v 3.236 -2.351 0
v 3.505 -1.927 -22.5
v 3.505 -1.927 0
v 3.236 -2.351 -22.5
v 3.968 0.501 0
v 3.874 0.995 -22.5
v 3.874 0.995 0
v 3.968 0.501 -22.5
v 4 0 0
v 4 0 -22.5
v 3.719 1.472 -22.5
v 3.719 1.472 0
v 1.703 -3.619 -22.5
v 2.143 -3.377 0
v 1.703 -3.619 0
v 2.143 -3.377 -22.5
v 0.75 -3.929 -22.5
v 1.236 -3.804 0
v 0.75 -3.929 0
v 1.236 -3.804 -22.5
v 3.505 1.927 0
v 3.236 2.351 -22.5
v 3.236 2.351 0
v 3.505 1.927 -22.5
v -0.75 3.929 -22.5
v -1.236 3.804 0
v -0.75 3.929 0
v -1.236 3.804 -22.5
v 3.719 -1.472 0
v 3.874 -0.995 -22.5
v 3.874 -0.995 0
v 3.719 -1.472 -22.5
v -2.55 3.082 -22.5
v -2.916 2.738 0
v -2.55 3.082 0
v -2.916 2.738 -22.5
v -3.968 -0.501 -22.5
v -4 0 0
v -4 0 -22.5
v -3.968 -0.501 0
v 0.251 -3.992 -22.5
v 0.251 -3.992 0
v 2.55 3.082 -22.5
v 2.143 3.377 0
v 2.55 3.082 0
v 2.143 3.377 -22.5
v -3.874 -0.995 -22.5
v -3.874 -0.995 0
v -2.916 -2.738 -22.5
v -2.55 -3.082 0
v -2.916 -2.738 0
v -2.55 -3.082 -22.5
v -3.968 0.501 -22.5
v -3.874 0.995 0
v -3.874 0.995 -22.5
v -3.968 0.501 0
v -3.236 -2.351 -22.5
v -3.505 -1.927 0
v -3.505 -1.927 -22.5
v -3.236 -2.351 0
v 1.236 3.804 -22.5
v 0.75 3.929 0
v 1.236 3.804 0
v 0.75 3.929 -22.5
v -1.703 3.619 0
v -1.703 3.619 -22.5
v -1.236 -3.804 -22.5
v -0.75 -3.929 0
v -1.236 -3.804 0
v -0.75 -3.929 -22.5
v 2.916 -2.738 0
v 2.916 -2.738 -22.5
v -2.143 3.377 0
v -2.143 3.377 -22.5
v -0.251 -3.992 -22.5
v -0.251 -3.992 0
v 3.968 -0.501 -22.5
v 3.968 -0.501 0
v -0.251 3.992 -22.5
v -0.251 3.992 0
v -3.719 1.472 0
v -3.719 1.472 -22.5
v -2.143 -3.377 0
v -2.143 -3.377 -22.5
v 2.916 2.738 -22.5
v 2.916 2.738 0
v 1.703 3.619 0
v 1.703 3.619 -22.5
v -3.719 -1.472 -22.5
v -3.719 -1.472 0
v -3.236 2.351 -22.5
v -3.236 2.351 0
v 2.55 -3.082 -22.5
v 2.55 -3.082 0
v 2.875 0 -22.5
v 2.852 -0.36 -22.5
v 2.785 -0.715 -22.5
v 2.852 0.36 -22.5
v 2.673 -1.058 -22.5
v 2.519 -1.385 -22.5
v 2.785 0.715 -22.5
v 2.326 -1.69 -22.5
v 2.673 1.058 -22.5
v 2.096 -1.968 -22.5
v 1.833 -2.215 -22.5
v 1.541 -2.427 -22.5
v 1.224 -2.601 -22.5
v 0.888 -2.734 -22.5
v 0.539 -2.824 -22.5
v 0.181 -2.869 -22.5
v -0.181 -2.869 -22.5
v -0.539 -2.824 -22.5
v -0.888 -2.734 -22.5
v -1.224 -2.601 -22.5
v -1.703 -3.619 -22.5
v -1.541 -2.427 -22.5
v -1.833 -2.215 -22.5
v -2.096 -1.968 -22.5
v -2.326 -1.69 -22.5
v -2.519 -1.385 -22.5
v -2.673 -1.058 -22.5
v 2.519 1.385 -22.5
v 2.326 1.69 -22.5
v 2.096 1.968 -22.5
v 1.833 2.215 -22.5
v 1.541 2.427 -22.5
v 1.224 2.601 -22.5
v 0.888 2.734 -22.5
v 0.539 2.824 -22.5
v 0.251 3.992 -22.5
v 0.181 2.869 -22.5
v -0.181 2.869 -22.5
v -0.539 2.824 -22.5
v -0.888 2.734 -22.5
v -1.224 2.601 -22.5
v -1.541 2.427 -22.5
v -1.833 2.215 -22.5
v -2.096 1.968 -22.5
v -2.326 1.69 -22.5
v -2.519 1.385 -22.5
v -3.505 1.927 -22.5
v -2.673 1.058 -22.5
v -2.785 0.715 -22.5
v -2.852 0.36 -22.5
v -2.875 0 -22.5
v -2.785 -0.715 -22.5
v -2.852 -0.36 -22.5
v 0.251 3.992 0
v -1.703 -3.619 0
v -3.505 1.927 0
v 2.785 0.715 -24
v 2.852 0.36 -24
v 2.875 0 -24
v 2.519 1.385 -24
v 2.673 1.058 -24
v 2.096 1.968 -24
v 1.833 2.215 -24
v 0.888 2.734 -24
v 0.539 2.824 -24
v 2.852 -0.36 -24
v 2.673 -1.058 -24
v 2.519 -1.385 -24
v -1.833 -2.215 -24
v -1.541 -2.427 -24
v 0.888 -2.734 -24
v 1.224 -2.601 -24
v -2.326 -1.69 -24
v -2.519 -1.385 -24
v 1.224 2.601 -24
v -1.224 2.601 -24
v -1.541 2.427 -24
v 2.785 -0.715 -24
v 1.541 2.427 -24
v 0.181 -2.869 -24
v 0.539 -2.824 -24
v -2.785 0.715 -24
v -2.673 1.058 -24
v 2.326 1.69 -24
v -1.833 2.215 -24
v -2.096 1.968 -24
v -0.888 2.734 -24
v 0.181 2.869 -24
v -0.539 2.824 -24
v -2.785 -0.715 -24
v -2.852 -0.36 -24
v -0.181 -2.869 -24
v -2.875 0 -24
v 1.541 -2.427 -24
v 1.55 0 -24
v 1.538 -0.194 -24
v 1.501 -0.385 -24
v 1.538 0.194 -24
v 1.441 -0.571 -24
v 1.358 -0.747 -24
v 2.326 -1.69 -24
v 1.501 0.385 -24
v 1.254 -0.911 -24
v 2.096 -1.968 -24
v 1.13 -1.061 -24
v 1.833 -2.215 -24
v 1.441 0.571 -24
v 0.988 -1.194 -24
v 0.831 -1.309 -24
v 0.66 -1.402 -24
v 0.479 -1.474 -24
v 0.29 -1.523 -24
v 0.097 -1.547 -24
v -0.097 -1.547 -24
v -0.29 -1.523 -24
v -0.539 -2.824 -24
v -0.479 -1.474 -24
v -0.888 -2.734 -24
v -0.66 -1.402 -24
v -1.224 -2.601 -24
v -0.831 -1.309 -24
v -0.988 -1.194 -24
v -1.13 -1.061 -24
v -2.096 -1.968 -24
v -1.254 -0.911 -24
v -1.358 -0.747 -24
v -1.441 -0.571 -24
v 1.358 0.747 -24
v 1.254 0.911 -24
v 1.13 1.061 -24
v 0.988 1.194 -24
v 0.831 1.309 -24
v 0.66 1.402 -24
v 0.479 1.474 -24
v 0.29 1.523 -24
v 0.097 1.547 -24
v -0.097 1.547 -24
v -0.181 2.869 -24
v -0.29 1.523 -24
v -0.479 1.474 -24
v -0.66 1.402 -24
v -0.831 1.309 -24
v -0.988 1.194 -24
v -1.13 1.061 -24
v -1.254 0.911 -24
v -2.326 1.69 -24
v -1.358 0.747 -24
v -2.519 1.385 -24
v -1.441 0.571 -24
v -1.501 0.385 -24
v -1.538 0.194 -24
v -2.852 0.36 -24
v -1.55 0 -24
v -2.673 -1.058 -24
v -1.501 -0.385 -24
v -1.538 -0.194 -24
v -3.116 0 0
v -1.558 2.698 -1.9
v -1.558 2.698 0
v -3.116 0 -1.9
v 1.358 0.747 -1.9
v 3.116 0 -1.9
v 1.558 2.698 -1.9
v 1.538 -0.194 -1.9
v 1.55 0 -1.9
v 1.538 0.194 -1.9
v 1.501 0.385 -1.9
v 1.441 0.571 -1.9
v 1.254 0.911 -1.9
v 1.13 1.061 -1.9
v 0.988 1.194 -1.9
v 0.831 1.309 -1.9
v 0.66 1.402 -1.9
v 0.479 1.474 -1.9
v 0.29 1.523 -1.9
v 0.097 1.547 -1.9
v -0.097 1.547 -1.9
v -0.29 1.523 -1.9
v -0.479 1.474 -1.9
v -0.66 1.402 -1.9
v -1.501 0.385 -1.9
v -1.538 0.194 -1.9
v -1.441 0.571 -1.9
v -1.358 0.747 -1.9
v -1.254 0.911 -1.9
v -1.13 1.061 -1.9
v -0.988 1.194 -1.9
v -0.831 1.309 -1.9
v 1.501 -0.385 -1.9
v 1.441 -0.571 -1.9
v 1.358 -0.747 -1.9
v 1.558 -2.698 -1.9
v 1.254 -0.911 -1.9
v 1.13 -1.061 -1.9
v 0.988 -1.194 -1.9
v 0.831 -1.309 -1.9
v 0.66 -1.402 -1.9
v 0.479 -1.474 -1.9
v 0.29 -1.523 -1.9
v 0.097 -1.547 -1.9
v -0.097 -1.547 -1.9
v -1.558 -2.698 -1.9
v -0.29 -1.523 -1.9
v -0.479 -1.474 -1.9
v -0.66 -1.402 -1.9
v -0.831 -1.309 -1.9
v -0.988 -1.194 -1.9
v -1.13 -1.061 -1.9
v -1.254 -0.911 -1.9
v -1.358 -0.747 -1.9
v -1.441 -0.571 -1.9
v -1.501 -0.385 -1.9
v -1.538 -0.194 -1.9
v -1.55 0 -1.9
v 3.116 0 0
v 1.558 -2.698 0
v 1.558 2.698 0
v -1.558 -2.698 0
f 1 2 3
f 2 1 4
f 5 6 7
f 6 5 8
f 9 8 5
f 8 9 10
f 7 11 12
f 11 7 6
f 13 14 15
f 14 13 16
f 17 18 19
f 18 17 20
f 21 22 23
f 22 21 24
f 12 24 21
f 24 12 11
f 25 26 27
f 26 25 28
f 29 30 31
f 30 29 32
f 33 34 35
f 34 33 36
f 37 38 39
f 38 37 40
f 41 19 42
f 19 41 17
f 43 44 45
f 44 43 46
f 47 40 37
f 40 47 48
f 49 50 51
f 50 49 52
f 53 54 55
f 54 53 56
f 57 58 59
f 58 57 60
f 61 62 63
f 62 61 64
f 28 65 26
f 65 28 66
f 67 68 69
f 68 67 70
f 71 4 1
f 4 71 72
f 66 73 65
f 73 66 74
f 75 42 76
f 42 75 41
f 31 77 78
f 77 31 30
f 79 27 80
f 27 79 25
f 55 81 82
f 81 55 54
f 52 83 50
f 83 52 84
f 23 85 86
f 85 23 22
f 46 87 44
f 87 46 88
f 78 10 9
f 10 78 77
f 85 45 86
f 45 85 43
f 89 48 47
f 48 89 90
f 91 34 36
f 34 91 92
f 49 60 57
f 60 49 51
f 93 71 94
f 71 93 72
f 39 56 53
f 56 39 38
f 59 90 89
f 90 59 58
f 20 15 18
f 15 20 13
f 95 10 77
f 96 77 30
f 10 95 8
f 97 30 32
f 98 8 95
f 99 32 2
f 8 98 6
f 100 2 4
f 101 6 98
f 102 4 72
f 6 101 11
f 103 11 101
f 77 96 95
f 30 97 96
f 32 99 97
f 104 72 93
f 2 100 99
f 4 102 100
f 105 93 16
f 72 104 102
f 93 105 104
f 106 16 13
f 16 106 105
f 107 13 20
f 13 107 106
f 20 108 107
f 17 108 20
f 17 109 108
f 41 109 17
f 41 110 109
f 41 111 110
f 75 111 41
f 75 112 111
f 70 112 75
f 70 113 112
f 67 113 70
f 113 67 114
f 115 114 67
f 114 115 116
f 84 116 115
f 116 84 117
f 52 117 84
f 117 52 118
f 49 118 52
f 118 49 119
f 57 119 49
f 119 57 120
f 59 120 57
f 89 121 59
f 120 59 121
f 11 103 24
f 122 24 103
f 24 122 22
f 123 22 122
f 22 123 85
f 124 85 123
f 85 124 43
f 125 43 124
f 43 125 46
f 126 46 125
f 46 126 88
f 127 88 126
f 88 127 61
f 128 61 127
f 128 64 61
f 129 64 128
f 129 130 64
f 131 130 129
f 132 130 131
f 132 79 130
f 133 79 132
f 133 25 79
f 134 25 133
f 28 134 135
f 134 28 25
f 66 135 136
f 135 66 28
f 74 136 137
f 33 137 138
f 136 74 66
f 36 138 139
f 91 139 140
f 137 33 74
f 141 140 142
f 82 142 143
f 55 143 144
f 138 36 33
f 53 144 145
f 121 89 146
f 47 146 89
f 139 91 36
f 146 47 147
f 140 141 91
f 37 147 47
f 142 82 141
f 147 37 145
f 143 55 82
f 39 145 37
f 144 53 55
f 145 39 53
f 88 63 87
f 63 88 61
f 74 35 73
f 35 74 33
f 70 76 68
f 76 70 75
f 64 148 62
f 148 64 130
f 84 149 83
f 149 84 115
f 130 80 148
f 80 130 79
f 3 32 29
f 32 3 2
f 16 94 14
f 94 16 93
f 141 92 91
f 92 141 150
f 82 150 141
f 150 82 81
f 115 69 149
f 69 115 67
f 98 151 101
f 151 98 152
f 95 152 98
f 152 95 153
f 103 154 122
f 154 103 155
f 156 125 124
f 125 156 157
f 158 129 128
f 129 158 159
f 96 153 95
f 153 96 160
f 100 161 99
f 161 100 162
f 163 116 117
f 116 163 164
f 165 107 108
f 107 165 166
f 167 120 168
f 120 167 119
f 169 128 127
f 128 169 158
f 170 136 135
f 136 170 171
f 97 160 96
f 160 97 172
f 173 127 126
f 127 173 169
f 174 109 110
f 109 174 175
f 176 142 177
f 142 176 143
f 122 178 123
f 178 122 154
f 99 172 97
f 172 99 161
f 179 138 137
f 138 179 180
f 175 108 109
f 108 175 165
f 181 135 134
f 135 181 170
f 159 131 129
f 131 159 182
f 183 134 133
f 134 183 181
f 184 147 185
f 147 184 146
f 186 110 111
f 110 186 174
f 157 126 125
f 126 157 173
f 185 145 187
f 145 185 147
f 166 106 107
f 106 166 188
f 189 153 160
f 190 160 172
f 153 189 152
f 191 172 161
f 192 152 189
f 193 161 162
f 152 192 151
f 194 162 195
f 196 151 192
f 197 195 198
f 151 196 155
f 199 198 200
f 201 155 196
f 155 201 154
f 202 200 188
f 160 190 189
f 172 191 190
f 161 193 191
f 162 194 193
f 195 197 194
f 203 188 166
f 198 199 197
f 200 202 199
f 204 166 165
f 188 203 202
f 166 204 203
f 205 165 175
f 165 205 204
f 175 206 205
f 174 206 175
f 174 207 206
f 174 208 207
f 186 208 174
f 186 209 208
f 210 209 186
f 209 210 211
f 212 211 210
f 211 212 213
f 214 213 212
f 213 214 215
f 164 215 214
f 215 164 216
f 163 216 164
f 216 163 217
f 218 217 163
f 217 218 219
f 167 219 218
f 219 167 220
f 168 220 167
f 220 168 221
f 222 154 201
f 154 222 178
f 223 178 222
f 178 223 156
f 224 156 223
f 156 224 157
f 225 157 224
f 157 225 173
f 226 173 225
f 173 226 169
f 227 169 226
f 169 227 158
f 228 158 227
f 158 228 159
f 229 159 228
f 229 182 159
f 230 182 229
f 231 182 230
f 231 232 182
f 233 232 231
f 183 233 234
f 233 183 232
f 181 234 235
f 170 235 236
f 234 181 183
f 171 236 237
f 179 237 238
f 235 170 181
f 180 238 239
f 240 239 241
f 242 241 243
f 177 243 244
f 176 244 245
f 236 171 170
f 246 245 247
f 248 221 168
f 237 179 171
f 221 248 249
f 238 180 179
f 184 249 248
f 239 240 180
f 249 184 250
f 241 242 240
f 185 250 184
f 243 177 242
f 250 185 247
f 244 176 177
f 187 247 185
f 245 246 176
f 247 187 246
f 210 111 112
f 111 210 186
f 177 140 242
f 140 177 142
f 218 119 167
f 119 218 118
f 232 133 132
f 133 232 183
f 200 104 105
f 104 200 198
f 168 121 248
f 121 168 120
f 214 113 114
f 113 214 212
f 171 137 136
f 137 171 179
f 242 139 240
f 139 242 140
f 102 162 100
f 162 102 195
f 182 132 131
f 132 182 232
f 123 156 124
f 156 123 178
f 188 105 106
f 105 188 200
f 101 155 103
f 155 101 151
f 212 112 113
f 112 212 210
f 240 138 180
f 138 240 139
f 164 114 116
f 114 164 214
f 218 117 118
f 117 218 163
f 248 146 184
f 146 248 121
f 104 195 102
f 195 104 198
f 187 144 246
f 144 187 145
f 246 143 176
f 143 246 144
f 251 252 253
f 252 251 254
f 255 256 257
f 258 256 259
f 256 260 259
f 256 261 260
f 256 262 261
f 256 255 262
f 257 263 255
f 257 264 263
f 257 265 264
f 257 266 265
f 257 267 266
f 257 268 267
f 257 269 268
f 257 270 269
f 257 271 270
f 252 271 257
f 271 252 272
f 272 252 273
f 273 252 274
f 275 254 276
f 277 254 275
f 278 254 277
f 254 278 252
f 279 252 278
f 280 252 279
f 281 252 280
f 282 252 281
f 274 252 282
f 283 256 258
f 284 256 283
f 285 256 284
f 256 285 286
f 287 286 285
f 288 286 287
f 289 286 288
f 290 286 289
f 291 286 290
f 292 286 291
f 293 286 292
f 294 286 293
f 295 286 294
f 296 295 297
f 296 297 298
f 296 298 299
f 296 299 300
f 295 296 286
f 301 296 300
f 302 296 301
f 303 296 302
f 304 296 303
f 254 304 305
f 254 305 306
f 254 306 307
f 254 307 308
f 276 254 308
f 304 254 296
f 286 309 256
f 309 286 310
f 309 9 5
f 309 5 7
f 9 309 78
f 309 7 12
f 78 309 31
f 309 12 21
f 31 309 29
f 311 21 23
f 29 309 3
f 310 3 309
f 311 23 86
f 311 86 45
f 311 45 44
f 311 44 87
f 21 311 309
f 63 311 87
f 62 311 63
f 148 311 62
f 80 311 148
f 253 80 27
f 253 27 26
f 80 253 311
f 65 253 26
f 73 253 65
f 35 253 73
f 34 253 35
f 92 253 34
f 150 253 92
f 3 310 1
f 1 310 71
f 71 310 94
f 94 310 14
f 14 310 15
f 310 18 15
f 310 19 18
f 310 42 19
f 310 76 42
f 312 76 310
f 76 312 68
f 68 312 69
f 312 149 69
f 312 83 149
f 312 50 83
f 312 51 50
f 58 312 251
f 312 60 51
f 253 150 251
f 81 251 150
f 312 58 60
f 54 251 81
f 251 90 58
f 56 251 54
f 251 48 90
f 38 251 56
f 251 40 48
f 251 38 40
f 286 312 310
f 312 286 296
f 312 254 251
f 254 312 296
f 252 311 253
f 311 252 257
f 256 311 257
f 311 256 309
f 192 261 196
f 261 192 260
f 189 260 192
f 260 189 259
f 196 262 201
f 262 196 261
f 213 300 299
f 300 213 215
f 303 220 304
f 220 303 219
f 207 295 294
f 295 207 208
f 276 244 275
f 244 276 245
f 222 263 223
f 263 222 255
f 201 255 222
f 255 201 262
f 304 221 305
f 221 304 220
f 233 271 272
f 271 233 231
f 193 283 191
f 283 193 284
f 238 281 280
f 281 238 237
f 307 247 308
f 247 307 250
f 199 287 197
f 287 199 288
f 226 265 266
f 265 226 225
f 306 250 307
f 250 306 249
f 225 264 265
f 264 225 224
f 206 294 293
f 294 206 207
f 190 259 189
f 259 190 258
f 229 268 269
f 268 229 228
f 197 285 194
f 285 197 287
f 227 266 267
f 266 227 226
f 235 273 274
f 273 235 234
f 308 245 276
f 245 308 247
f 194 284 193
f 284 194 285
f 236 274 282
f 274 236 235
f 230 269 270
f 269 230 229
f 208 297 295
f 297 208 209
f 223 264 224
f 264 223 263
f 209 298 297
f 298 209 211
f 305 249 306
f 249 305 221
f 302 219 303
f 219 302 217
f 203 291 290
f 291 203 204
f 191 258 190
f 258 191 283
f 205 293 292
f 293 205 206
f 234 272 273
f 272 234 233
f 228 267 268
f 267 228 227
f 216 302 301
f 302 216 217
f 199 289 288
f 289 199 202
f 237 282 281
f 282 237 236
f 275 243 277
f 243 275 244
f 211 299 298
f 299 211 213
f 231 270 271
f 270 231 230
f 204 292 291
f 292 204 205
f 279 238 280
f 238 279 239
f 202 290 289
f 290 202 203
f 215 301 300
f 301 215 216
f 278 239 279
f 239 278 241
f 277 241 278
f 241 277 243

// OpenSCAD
$fn = 50;

difference() {
	union() {
		translate(v = [0, 0, -22.5]) {
			cylinder(h = 25.5, r = 4.0);
		}
		#translate(v = [0, 0, -24.0]) {
			cylinder(h = 24, r = 2.875);
		}
	}
	union() {
		translate(v = [0, 0, 0]) {
			rotate(a = [0, 0, 0]) {
				difference() {
					union() {
						translate(v = [0, 0, -1.9]) {
							linear_extrude(height = 1.9) {
								polygon(points = [[3.1158, 0.0], [1.5579000000000005, 2.698361953111554], [-1.5578999999999994, 2.6983619531115544], [-3.1158, 3.815754496783323e-16], [-1.5579000000000014, -2.6983619531115535], [1.557899999999998, -2.6983619531115552]]);
							}
						}
					}
					union();
				}
			}
		}
		#cylinder(h = 3, r = 5.0);
		#translate(v = [0, 0, -100.0]) {
			cylinder(h = 200, r = 1.55);
		}
	}
}
